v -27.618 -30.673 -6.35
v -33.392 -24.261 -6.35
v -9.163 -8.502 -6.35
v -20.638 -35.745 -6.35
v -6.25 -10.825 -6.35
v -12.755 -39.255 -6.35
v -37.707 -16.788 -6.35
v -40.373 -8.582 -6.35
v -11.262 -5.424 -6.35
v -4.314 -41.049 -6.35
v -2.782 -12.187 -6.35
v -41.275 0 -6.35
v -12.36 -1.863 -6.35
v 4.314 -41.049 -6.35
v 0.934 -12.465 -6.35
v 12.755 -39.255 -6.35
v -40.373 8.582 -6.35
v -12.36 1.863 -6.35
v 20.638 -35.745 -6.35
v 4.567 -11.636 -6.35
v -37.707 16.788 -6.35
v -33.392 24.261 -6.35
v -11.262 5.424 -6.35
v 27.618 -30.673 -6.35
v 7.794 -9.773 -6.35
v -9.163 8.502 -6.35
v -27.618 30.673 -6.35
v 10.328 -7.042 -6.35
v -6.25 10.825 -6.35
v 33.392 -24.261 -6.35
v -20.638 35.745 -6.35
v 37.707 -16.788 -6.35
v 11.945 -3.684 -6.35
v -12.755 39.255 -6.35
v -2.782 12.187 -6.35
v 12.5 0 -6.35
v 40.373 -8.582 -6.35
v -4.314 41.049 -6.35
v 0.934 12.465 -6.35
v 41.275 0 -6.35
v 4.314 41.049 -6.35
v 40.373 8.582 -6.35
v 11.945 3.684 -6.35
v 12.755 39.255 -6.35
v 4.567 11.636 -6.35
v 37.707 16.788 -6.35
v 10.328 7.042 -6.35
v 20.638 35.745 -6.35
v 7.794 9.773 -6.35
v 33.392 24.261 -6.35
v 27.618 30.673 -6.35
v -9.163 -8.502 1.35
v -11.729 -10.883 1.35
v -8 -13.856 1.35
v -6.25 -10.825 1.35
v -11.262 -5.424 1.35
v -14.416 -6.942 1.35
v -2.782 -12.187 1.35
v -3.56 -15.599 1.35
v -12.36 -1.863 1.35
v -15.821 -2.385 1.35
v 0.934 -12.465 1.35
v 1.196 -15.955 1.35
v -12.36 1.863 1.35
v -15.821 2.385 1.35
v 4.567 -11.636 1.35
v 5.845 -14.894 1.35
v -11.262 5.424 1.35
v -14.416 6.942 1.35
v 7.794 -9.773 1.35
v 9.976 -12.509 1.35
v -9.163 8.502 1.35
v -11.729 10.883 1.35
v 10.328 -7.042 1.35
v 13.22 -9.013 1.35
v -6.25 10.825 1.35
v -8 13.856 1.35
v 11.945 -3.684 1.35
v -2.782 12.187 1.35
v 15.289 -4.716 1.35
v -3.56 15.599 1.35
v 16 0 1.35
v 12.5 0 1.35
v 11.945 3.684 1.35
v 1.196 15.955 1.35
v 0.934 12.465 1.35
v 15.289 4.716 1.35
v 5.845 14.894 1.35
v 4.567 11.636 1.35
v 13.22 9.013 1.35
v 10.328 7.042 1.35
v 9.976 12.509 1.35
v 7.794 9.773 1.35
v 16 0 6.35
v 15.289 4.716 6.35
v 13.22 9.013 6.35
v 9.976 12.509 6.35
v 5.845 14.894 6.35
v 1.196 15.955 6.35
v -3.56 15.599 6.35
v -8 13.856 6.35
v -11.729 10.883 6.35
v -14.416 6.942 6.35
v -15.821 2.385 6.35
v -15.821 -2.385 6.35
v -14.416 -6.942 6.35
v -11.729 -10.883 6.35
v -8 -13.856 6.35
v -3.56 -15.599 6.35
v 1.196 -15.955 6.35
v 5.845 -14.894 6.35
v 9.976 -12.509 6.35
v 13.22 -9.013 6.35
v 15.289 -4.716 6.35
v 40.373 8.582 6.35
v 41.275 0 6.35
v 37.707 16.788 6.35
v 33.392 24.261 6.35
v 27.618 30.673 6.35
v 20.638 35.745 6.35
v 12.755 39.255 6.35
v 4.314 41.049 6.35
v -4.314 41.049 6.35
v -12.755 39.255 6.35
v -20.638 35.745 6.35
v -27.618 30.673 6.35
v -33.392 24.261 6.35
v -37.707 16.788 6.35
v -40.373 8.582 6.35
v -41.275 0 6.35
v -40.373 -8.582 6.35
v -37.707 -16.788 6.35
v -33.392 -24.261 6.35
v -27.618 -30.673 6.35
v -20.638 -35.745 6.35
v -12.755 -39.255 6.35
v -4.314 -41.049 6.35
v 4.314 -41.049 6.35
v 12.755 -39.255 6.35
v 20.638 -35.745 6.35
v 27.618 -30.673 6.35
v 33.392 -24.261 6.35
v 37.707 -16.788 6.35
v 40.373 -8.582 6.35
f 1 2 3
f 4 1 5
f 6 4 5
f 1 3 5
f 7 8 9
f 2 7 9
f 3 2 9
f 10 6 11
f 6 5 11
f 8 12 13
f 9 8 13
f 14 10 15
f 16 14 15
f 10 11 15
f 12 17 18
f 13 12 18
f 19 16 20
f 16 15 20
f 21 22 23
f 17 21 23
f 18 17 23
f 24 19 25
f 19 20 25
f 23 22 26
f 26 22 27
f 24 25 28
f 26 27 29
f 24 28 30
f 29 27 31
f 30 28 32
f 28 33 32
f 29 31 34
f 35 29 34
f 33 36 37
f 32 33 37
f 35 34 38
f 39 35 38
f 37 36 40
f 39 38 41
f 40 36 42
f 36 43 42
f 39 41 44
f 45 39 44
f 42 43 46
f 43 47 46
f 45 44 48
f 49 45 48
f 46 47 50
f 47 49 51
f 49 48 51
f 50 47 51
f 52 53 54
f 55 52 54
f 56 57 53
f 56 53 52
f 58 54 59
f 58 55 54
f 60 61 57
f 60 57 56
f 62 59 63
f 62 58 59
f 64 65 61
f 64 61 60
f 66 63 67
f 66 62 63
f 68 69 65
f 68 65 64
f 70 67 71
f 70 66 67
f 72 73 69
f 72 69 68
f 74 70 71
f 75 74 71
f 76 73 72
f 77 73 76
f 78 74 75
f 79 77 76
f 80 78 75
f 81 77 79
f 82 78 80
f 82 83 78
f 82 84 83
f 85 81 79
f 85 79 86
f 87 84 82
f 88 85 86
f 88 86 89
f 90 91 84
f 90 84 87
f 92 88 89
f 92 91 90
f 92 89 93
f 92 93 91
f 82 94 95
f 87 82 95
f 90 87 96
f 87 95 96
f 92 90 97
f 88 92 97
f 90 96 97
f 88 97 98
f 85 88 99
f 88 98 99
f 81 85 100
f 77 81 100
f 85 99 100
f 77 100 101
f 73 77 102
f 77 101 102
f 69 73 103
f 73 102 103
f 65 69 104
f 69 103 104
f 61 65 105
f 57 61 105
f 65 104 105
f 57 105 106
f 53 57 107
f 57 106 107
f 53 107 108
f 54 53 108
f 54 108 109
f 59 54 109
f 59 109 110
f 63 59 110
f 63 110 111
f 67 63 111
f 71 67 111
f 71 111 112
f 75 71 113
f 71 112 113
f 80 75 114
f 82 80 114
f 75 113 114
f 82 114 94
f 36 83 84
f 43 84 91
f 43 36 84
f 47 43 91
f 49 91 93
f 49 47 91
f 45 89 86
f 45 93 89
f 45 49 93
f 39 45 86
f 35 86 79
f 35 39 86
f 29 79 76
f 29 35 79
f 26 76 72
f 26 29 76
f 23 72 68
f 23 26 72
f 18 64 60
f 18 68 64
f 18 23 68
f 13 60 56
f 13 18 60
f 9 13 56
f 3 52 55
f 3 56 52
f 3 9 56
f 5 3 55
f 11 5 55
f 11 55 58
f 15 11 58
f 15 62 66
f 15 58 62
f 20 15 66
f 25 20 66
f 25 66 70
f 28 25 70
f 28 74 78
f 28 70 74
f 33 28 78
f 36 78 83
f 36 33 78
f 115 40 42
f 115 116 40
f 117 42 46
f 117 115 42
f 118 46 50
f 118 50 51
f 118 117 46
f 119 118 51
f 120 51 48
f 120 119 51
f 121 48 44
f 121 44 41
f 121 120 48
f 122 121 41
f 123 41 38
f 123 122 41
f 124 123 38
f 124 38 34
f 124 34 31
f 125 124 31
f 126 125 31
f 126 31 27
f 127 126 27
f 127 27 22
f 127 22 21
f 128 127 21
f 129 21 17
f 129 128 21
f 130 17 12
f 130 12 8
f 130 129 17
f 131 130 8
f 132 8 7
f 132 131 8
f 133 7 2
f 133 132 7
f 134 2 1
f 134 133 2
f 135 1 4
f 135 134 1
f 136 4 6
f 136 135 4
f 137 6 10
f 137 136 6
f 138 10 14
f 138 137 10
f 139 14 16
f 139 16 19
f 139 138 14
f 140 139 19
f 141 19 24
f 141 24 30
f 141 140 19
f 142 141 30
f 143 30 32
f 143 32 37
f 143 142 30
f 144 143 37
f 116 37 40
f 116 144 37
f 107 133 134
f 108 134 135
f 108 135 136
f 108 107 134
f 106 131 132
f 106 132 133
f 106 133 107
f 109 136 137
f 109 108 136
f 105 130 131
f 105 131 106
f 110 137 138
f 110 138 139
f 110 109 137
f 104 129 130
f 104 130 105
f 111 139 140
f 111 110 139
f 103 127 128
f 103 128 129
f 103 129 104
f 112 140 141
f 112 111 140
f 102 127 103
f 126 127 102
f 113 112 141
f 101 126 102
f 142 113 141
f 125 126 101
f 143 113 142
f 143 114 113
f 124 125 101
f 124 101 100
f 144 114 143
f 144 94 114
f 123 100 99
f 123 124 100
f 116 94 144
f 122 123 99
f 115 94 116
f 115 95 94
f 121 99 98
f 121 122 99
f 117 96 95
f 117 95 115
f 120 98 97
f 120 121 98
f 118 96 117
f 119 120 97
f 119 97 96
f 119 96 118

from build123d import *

# Parameters (mm, degrees)
SKETCH1_R               = 41.275
BOSS_EXTRUDE1_DEPTH     = 6.35
CUT_EXTRUDE1_DEPTH      = 60.737268518
CUT_EXTRUDE1_DEPTH_BACK = 60.737268518
SKETCH2_R               = 12.500000019
SKETCH3_R               = 16.000000004
CUT_EXTRUDE2_DEPTH      = 5


with BuildPart() as part:
    # Sketch1 → Boss-Extrude1 (new, symmetric)
    with BuildSketch(Plane.XY):
        Circle(SKETCH1_R)
    extrude(amount=BOSS_EXTRUDE1_DEPTH, both=True)

    # Sketch2 → Cut-Extrude1 (cut, two sides: drawn at the far end of the back side and taken through both)
    with BuildSketch(Plane.XY.offset(6.35).offset(-CUT_EXTRUDE1_DEPTH_BACK)):
        Circle(SKETCH2_R)
    extrude(amount=CUT_EXTRUDE1_DEPTH + CUT_EXTRUDE1_DEPTH_BACK, mode=Mode.SUBTRACT)

    # Sketch3 → Cut-Extrude2 (cut)
    with BuildSketch(Plane.XY.offset(6.35)):
        Circle(SKETCH3_R)
    extrude(amount=-CUT_EXTRUDE2_DEPTH, mode=Mode.SUBTRACT)


solid = part.part
